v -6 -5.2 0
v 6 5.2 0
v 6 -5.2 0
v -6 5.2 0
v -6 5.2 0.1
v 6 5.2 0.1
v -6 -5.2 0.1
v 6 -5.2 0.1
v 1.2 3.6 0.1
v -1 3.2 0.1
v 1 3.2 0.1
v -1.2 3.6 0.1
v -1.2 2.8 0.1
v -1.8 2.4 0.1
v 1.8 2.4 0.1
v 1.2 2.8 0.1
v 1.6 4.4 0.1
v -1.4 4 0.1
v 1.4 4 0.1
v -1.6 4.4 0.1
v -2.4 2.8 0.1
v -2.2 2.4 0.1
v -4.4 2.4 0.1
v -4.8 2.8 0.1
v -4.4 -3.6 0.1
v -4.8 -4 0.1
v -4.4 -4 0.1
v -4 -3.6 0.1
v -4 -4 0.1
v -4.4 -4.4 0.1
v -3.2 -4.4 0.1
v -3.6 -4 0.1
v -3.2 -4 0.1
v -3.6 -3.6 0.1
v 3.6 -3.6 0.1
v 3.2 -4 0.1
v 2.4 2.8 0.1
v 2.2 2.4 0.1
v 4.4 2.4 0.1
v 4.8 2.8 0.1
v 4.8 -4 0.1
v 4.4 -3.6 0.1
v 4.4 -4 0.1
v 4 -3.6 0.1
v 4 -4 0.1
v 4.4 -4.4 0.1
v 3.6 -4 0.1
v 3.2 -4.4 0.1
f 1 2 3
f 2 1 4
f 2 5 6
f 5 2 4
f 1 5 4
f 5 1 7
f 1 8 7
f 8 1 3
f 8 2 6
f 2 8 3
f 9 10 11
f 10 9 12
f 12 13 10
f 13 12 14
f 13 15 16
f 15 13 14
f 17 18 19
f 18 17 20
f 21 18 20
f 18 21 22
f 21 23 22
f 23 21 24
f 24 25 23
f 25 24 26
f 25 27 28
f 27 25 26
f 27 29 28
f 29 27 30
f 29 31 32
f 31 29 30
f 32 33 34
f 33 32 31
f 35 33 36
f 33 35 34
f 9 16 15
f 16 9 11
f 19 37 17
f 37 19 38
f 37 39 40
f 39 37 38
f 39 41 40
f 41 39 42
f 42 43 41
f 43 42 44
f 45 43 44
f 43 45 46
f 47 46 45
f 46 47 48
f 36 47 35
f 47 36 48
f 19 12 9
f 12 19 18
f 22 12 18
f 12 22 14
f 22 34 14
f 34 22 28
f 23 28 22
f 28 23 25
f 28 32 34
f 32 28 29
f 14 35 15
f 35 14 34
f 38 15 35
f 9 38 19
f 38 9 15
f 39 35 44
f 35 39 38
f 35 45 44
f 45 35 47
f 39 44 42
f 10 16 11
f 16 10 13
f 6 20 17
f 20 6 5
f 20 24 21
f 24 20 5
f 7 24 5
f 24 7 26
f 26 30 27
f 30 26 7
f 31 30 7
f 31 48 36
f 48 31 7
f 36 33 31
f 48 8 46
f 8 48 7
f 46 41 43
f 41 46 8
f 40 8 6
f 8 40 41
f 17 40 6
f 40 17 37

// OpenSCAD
// file: ../p/box5-12.scad
use <../lib.scad>
function ldraw_lib__box5_12() = [
// 0 Box with 5 Faces without Any Edges
// 0 Name: box5-12.dat
// 0 Author: Chris Dee [cwdee]
// 0 !LDRAW_ORG Primitive UPDATE 2009-02
// 0 !LICENSE Licensed under CC BY 2.0 and CC BY 4.0 : see CAreadme.txt
// 
// 0 BFC CERTIFY CCW
  [0,"BFC","CERTIFY"],
  [0,"BFC","CCW"],
// 
// 0 !HISTORY 2009-09-03 [PTadmin] Official Update 2009-02
// 
// 
// 4 16 1 1 1 1 1 -1 -1 1 -1 -1 1 1
  [4,16,1,1,1,1,1,-1,-1,1,-1,-1,1,1],
// 4 16 -1 0 1 1 0 1 1 1 1 -1 1 1
  [4,16,-1,0,1,1,0,1,1,1,1,-1,1,1],
// 4 16 -1 0 -1 -1 0 1 -1 1 1 -1 1 -1
  [4,16,-1,0,-1,-1,0,1,-1,1,1,-1,1,-1],
// 4 16 1 0 -1 -1 0 -1 -1 1 -1 1 1 -1
  [4,16,1,0,-1,-1,0,-1,-1,1,-1,1,1,-1],
// 4 16 1 0 1 1 0 -1 1 1 -1 1 1 1
  [4,16,1,0,1,1,0,-1,1,1,-1,1,1,1],
// 0
];
makepoly(ldraw_lib__box5_12(), line=0.2);
// main file
use <../lib.scad>
use <../p/box5-12.scad>
function ldraw_lib__163555g() = [
// 0 Sticker  1.3 x  1.5 with White Suitcase
// 0 Name: 163555g.dat
// 0 Author: Takeshi Takahashi [RainbowDolphin]
// 0 !LDRAW_ORG Part UPDATE 2022-05
// 0 !LICENSE Licensed under CC BY 2.0 and CC BY 4.0 : see CAreadme.txt
// 
// 0 BFC CERTIFY CCW
  [0,"BFC","CERTIFY"],
  [0,"BFC","CCW"],
// 
// 0 !KEYWORDS Airport Shuttle, Bricklink 6399stk01, Brickowl 458337, Locker
// 0 !KEYWORDS Monorail, Rebrickable 163555, set 6399, Station
// 
// 0 !HISTORY 2022-09-15 [PTadmin] Official Update 2022-05
// 
// 
// 1 16 0 -0.25 0 15 0 0 0 0.25 0 0 0 13 box5-12.dat
  [1,16,0,-0.25,0,15,0,0,0,0.25,0,0,0,13, ldraw_lib__box5_12()],
// 0 BFC NOCLIP
  [0,"BFC","NOCLIP"],
// 4 0 -2.5 -0.25 8 2.5 -0.25 8 3 -0.25 9 -3 -0.25 9
  [4,0,-2.5,-0.25,8,2.5,-0.25,8,3,-0.25,9,-3,-0.25,9],
// 4 0 -3 -0.25 7 -2.5 -0.25 8 -3 -0.25 9 -4.5 -0.25 6
  [4,0,-3,-0.25,7,-2.5,-0.25,8,-3,-0.25,9,-4.5,-0.25,6],
// 4 0 -3 -0.25 7 -4.5 -0.25 6 4.5 -0.25 6 3 -0.25 7
  [4,0,-3,-0.25,7,-4.5,-0.25,6,4.5,-0.25,6,3,-0.25,7],
// 4 0 -3.5 -0.25 10 3.5 -0.25 10 4 -0.25 11 -4 -0.25 11
  [4,0,-3.5,-0.25,10,3.5,-0.25,10,4,-0.25,11,-4,-0.25,11],
// 4 0 -5.5 -0.25 6 -3.5 -0.25 10 -4 -0.25 11 -6 -0.25 7
  [4,0,-5.5,-0.25,6,-3.5,-0.25,10,-4,-0.25,11,-6,-0.25,7],
// 4 0 -11 -0.25 6 -5.5 -0.25 6 -6 -0.25 7 -12 -0.25 7
  [4,0,-11,-0.25,6,-5.5,-0.25,6,-6,-0.25,7,-12,-0.25,7],
// 4 0 -11 -0.25 -9 -11 -0.25 6 -12 -0.25 7 -12 -0.25 -10
  [4,0,-11,-0.25,-9,-11,-0.25,6,-12,-0.25,7,-12,-0.25,-10],
// 4 0 -11 -0.25 -9 -12 -0.25 -10 -11 -0.25 -10 -10 -0.25 -9
  [4,0,-11,-0.25,-9,-12,-0.25,-10,-11,-0.25,-10,-10,-0.25,-9],
// 4 0 -10 -0.25 -10 -10 -0.25 -9 -11 -0.25 -10 -11 -0.25 -11
  [4,0,-10,-0.25,-10,-10,-0.25,-9,-11,-0.25,-10,-11,-0.25,-11],
// 4 0 -10 -0.25 -10 -11 -0.25 -11 -8 -0.25 -11 -9 -0.25 -10
  [4,0,-10,-0.25,-10,-11,-0.25,-11,-8,-0.25,-11,-9,-0.25,-10],
// 4 0 -9 -0.25 -10 -8 -0.25 -11 -8 -0.25 -10 -9 -0.25 -9
  [4,0,-9,-0.25,-10,-8,-0.25,-11,-8,-0.25,-10,-9,-0.25,-9],
// 4 0 9 -0.25 -9 -9 -0.25 -9 -8 -0.25 -10 8 -0.25 -10
  [4,0,9,-0.25,-9,-9,-0.25,-9,-8,-0.25,-10,8,-0.25,-10],
// 4 0 3 -0.25 9 2.5 -0.25 8 3 -0.25 7 4.5 -0.25 6
  [4,0,3,-0.25,9,2.5,-0.25,8,3,-0.25,7,4.5,-0.25,6],
// 4 0 4 -0.25 11 3.5 -0.25 10 5.5 -0.25 6 6 -0.25 7
  [4,0,4,-0.25,11,3.5,-0.25,10,5.5,-0.25,6,6,-0.25,7],
// 4 0 6 -0.25 7 5.5 -0.25 6 11 -0.25 6 12 -0.25 7
  [4,0,6,-0.25,7,5.5,-0.25,6,11,-0.25,6,12,-0.25,7],
// 4 0 12 -0.25 7 11 -0.25 6 11 -0.25 -9 12 -0.25 -10
  [4,0,12,-0.25,7,11,-0.25,6,11,-0.25,-9,12,-0.25,-10],
// 4 0 11 -0.25 -10 12 -0.25 -10 11 -0.25 -9 10 -0.25 -9
  [4,0,11,-0.25,-10,12,-0.25,-10,11,-0.25,-9,10,-0.25,-9],
// 4 0 11 -0.25 -10 10 -0.25 -9 10 -0.25 -10 11 -0.25 -11
  [4,0,11,-0.25,-10,10,-0.25,-9,10,-0.25,-10,11,-0.25,-11],
// 4 0 8 -0.25 -11 11 -0.25 -11 10 -0.25 -10 9 -0.25 -10
  [4,0,8,-0.25,-11,11,-0.25,-11,10,-0.25,-10,9,-0.25,-10],
// 4 0 8 -0.25 -10 8 -0.25 -11 9 -0.25 -10 9 -0.25 -9
  [4,0,8,-0.25,-10,8,-0.25,-11,9,-0.25,-10,9,-0.25,-9],
// 4 15 3.5 -0.25 10 -3.5 -0.25 10 -3 -0.25 9 3 -0.25 9
  [4,15,3.5,-0.25,10,-3.5,-0.25,10,-3,-0.25,9,3,-0.25,9],
// 4 15 -4.5 -0.25 6 -3 -0.25 9 -3.5 -0.25 10 -5.5 -0.25 6
  [4,15,-4.5,-0.25,6,-3,-0.25,9,-3.5,-0.25,10,-5.5,-0.25,6],
// 4 15 -9 -0.25 -9 -4.5 -0.25 6 -5.5 -0.25 6 -10 -0.25 -9
  [4,15,-9,-0.25,-9,-4.5,-0.25,6,-5.5,-0.25,6,-10,-0.25,-9],
// 4 15 -10 -0.25 -9 -5.5 -0.25 6 -11 -0.25 6 -11 -0.25 -9
  [4,15,-10,-0.25,-9,-5.5,-0.25,6,-11,-0.25,6,-11,-0.25,-9],
// 4 15 -9 -0.25 -9 -10 -0.25 -9 -10 -0.25 -10 -9 -0.25 -10
  [4,15,-9,-0.25,-9,-10,-0.25,-9,-10,-0.25,-10,-9,-0.25,-10],
// 4 15 4.5 -0.25 6 -4.5 -0.25 6 -9 -0.25 -9 9 -0.25 -9
  [4,15,4.5,-0.25,6,-4.5,-0.25,6,-9,-0.25,-9,9,-0.25,-9],
// 3 15 5.5 -0.25 6 4.5 -0.25 6 9 -0.25 -9
  [3,15,5.5,-0.25,6,4.5,-0.25,6,9,-0.25,-9],
// 4 15 3 -0.25 9 4.5 -0.25 6 5.5 -0.25 6 3.5 -0.25 10
  [4,15,3,-0.25,9,4.5,-0.25,6,5.5,-0.25,6,3.5,-0.25,10],
// 4 15 11 -0.25 6 5.5 -0.25 6 9 -0.25 -9 10 -0.25 -9
  [4,15,11,-0.25,6,5.5,-0.25,6,9,-0.25,-9,10,-0.25,-9],
// 4 15 10 -0.25 -9 9 -0.25 -9 9 -0.25 -10 10 -0.25 -10
  [4,15,10,-0.25,-9,9,-0.25,-9,9,-0.25,-10,10,-0.25,-10],
// 3 15 11 -0.25 6 10 -0.25 -9 11 -0.25 -9
  [3,15,11,-0.25,6,10,-0.25,-9,11,-0.25,-9],
// 0 BFC CLIP
  [0,"BFC","CLIP"],
// 4 16 -3 -0.25 7 3 -0.25 7 2.5 -0.25 8 -2.5 -0.25 8
  [4,16,-3,-0.25,7,3,-0.25,7,2.5,-0.25,8,-2.5,-0.25,8],
// 4 16 15 -0.25 13 -15 -0.25 13 -4 -0.25 11 4 -0.25 11
  [4,16,15,-0.25,13,-15,-0.25,13,-4,-0.25,11,4,-0.25,11],
// 4 16 -6 -0.25 7 -4 -0.25 11 -15 -0.25 13 -12 -0.25 7
  [4,16,-6,-0.25,7,-4,-0.25,11,-15,-0.25,13,-12,-0.25,7],
// 4 16 -12 -0.25 -10 -12 -0.25 7 -15 -0.25 13 -15 -0.25 -13
  [4,16,-12,-0.25,-10,-12,-0.25,7,-15,-0.25,13,-15,-0.25,-13],
// 4 16 -11 -0.25 -10 -12 -0.25 -10 -15 -0.25 -13 -11 -0.25 -11
  [4,16,-11,-0.25,-10,-12,-0.25,-10,-15,-0.25,-13,-11,-0.25,-11],
// 3 16 -8 -0.25 -11 -11 -0.25 -11 -15 -0.25 -13
  [3,16,-8,-0.25,-11,-11,-0.25,-11,-15,-0.25,-13],
// 4 16 -8 -0.25 -11 -15 -0.25 -13 8 -0.25 -11 8 -0.25 -10
  [4,16,-8,-0.25,-11,-15,-0.25,-13,8,-0.25,-11,8,-0.25,-10],
// 3 16 8 -0.25 -10 -8 -0.25 -10 -8 -0.25 -11
  [3,16,8,-0.25,-10,-8,-0.25,-10,-8,-0.25,-11],
// 4 16 8 -0.25 -11 -15 -0.25 -13 15 -0.25 -13 11 -0.25 -11
  [4,16,8,-0.25,-11,-15,-0.25,-13,15,-0.25,-13,11,-0.25,-11],
// 4 16 11 -0.25 -10 11 -0.25 -11 15 -0.25 -13 12 -0.25 -10
  [4,16,11,-0.25,-10,11,-0.25,-11,15,-0.25,-13,12,-0.25,-10],
// 4 16 12 -0.25 7 12 -0.25 -10 15 -0.25 -13 15 -0.25 13
  [4,16,12,-0.25,7,12,-0.25,-10,15,-0.25,-13,15,-0.25,13],
// 4 16 6 -0.25 7 12 -0.25 7 15 -0.25 13 4 -0.25 11
  [4,16,6,-0.25,7,12,-0.25,7,15,-0.25,13,4,-0.25,11],
];
makepoly(ldraw_lib__163555g(), line=0.2);
